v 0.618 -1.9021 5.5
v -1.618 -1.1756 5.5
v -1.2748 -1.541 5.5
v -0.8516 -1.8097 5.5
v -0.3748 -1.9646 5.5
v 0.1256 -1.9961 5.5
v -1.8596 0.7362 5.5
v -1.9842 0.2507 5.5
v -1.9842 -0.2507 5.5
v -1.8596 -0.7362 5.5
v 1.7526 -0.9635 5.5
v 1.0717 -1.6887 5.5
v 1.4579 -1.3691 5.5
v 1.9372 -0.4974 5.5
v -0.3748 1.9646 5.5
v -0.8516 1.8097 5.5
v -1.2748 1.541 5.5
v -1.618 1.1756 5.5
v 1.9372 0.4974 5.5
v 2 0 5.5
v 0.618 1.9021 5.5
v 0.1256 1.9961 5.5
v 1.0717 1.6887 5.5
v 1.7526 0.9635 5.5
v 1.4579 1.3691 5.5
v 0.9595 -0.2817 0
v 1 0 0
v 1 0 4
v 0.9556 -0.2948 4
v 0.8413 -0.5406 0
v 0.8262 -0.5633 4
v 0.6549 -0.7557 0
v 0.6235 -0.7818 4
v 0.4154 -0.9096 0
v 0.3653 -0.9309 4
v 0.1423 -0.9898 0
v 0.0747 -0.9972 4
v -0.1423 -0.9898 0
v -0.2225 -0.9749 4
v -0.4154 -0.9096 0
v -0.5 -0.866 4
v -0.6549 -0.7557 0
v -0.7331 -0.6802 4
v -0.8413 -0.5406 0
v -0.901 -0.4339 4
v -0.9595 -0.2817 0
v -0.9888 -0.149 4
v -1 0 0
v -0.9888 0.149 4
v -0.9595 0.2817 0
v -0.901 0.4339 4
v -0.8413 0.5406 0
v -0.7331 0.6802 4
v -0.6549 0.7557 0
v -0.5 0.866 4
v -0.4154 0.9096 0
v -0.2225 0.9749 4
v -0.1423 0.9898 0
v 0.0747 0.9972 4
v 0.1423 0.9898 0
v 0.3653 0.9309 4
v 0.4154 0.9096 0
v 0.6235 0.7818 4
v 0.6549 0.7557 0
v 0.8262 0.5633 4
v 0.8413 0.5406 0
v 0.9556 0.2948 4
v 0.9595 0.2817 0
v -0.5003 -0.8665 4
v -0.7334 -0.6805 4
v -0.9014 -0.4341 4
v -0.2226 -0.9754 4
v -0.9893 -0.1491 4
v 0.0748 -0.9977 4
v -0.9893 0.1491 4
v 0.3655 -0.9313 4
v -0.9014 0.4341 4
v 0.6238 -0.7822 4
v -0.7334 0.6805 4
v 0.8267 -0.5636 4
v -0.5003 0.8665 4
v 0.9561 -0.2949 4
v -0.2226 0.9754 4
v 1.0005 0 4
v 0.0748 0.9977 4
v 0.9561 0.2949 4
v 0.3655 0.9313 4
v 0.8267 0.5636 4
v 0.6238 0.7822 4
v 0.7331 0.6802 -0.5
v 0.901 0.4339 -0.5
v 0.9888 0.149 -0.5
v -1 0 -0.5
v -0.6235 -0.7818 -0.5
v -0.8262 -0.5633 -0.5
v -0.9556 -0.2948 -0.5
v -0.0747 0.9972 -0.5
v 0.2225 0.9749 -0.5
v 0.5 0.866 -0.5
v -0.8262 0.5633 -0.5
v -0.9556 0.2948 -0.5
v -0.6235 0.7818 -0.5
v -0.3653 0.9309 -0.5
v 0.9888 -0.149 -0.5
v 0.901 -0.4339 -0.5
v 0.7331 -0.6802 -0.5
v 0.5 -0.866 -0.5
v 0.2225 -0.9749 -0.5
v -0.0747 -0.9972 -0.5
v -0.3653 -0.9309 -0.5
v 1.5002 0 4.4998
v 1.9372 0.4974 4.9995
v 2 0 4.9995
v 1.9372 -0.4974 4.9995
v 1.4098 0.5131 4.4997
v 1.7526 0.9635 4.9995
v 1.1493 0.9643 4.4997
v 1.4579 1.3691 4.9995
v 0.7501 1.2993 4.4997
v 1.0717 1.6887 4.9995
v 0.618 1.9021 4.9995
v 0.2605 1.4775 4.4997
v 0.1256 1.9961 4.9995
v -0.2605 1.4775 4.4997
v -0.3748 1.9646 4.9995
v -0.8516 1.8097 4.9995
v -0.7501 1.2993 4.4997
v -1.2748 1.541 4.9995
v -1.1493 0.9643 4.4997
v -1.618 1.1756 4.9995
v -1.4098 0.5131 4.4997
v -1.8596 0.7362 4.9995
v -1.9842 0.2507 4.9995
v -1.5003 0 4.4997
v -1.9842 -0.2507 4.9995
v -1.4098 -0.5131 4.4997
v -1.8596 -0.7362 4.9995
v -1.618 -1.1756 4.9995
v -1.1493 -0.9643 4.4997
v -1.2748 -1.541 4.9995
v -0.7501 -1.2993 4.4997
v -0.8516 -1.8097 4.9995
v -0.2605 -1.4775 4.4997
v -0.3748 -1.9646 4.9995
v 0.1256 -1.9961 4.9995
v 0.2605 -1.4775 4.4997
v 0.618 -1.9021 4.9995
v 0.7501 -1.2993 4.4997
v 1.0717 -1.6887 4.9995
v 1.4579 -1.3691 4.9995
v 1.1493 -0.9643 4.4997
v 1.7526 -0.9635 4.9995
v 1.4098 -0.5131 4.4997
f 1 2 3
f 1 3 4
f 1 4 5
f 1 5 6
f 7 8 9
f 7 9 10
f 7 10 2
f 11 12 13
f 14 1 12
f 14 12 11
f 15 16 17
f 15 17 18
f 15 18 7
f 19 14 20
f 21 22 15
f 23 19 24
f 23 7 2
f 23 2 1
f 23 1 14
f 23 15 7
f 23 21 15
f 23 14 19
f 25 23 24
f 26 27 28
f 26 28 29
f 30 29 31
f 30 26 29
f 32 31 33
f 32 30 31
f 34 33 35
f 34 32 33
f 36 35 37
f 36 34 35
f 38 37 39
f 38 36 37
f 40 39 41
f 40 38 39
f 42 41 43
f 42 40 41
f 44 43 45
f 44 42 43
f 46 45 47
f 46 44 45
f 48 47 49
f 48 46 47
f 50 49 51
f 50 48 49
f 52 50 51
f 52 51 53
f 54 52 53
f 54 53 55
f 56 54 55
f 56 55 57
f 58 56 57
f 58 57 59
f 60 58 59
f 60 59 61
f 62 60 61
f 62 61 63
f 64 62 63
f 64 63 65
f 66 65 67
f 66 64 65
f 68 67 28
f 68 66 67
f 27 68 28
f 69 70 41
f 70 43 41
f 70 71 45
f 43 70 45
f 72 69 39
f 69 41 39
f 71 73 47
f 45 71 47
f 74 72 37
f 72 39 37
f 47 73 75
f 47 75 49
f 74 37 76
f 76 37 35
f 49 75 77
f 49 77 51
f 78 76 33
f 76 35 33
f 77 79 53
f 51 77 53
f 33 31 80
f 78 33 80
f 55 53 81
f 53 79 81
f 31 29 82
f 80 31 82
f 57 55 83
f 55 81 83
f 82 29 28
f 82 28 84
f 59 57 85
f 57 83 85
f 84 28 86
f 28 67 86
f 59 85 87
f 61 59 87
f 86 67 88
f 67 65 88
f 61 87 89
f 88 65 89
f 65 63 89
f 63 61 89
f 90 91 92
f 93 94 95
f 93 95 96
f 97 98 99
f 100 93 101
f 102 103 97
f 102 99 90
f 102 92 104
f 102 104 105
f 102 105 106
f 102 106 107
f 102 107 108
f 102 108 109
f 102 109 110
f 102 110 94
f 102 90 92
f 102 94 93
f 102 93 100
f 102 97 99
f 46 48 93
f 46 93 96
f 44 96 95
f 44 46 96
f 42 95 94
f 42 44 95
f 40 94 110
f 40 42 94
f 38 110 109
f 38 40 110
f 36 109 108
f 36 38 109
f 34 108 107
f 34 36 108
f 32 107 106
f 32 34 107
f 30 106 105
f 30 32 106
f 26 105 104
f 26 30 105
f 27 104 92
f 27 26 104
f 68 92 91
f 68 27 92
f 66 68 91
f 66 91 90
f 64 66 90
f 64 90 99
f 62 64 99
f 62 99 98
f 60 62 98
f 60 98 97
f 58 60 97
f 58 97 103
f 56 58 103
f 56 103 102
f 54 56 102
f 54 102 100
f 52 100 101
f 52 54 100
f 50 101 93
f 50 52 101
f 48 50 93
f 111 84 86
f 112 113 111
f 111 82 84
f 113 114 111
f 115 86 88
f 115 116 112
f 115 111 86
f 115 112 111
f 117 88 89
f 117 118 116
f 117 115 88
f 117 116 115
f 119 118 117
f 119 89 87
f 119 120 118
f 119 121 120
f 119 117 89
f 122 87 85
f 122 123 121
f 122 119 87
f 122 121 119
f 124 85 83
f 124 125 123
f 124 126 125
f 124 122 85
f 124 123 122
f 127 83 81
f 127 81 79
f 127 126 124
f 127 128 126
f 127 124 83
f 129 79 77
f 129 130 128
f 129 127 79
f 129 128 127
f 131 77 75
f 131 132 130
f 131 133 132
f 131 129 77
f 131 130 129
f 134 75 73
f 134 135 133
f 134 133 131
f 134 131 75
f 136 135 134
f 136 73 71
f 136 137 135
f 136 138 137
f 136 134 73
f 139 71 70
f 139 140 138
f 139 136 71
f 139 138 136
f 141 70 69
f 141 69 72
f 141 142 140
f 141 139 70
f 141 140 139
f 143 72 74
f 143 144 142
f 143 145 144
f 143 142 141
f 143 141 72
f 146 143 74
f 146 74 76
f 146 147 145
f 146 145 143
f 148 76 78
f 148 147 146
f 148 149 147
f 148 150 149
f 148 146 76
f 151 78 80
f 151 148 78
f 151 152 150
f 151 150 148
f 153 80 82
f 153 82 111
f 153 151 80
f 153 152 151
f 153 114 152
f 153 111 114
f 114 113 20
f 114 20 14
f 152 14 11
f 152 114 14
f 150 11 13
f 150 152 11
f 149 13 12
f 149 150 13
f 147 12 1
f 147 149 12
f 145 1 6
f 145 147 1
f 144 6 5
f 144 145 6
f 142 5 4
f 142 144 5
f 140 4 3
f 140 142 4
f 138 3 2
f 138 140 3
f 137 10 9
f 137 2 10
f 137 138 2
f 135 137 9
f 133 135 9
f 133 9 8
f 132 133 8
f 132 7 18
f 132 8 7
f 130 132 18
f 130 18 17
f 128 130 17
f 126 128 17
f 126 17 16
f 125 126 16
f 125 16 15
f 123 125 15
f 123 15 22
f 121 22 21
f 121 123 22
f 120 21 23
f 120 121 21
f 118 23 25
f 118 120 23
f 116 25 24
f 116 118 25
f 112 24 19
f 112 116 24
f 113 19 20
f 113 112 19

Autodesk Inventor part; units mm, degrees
ref_plane "YZ Plane" through (0, 0, 0) normal (1, 0, 0) x (0, 1, 0)
ref_plane "XZ Plane" through (0, 0, 0) normal (0, 1, 0) x (-1, 0, 0)
ref_plane "XY Plane" through (0, 0, 0) normal (0, 0, 1) x (1, 0, 0)
sketch "スケッチ1" plane through (0, 0, 0) normal (0, 0, 1) x (1, 0, 0)
  circle A0 centre (0, 0) radius 1
  dimension "d0" = 2
extrude "押し出し1" add sketch "スケッチ1" along normal blind 4
sketch "スケッチ2" plane through (0, 0, 4) normal (0, 0, 1) x (1, 0, 0)
  circle A0 centre (0, 0) radius 1 projected
  circle A1 centre (0, 0) radius 2
  dimension "d3" = 4
extrude "押し出し2" add sketch "スケッチ2" along normal blind 1.5 contours A0 | A1
chamfer "面取り1" distance 1 angle 45 1 edges at (-2, 0, 4)
thread "ねじ1" size "M2x0.4" class "6g" standard "ANSI Metric M Profile" full length
sketch "スケッチ3" plane through (0, 0, 0) normal (0, 0, -1) x (-1, 0, 0)
  circle A0 centre (0, 0) radius 1 projected
extrude "押し出し3" add sketch "スケッチ3" along normal blind 0.5
properties part number "SB M2 8mm皿ネジ" material "Steel"
